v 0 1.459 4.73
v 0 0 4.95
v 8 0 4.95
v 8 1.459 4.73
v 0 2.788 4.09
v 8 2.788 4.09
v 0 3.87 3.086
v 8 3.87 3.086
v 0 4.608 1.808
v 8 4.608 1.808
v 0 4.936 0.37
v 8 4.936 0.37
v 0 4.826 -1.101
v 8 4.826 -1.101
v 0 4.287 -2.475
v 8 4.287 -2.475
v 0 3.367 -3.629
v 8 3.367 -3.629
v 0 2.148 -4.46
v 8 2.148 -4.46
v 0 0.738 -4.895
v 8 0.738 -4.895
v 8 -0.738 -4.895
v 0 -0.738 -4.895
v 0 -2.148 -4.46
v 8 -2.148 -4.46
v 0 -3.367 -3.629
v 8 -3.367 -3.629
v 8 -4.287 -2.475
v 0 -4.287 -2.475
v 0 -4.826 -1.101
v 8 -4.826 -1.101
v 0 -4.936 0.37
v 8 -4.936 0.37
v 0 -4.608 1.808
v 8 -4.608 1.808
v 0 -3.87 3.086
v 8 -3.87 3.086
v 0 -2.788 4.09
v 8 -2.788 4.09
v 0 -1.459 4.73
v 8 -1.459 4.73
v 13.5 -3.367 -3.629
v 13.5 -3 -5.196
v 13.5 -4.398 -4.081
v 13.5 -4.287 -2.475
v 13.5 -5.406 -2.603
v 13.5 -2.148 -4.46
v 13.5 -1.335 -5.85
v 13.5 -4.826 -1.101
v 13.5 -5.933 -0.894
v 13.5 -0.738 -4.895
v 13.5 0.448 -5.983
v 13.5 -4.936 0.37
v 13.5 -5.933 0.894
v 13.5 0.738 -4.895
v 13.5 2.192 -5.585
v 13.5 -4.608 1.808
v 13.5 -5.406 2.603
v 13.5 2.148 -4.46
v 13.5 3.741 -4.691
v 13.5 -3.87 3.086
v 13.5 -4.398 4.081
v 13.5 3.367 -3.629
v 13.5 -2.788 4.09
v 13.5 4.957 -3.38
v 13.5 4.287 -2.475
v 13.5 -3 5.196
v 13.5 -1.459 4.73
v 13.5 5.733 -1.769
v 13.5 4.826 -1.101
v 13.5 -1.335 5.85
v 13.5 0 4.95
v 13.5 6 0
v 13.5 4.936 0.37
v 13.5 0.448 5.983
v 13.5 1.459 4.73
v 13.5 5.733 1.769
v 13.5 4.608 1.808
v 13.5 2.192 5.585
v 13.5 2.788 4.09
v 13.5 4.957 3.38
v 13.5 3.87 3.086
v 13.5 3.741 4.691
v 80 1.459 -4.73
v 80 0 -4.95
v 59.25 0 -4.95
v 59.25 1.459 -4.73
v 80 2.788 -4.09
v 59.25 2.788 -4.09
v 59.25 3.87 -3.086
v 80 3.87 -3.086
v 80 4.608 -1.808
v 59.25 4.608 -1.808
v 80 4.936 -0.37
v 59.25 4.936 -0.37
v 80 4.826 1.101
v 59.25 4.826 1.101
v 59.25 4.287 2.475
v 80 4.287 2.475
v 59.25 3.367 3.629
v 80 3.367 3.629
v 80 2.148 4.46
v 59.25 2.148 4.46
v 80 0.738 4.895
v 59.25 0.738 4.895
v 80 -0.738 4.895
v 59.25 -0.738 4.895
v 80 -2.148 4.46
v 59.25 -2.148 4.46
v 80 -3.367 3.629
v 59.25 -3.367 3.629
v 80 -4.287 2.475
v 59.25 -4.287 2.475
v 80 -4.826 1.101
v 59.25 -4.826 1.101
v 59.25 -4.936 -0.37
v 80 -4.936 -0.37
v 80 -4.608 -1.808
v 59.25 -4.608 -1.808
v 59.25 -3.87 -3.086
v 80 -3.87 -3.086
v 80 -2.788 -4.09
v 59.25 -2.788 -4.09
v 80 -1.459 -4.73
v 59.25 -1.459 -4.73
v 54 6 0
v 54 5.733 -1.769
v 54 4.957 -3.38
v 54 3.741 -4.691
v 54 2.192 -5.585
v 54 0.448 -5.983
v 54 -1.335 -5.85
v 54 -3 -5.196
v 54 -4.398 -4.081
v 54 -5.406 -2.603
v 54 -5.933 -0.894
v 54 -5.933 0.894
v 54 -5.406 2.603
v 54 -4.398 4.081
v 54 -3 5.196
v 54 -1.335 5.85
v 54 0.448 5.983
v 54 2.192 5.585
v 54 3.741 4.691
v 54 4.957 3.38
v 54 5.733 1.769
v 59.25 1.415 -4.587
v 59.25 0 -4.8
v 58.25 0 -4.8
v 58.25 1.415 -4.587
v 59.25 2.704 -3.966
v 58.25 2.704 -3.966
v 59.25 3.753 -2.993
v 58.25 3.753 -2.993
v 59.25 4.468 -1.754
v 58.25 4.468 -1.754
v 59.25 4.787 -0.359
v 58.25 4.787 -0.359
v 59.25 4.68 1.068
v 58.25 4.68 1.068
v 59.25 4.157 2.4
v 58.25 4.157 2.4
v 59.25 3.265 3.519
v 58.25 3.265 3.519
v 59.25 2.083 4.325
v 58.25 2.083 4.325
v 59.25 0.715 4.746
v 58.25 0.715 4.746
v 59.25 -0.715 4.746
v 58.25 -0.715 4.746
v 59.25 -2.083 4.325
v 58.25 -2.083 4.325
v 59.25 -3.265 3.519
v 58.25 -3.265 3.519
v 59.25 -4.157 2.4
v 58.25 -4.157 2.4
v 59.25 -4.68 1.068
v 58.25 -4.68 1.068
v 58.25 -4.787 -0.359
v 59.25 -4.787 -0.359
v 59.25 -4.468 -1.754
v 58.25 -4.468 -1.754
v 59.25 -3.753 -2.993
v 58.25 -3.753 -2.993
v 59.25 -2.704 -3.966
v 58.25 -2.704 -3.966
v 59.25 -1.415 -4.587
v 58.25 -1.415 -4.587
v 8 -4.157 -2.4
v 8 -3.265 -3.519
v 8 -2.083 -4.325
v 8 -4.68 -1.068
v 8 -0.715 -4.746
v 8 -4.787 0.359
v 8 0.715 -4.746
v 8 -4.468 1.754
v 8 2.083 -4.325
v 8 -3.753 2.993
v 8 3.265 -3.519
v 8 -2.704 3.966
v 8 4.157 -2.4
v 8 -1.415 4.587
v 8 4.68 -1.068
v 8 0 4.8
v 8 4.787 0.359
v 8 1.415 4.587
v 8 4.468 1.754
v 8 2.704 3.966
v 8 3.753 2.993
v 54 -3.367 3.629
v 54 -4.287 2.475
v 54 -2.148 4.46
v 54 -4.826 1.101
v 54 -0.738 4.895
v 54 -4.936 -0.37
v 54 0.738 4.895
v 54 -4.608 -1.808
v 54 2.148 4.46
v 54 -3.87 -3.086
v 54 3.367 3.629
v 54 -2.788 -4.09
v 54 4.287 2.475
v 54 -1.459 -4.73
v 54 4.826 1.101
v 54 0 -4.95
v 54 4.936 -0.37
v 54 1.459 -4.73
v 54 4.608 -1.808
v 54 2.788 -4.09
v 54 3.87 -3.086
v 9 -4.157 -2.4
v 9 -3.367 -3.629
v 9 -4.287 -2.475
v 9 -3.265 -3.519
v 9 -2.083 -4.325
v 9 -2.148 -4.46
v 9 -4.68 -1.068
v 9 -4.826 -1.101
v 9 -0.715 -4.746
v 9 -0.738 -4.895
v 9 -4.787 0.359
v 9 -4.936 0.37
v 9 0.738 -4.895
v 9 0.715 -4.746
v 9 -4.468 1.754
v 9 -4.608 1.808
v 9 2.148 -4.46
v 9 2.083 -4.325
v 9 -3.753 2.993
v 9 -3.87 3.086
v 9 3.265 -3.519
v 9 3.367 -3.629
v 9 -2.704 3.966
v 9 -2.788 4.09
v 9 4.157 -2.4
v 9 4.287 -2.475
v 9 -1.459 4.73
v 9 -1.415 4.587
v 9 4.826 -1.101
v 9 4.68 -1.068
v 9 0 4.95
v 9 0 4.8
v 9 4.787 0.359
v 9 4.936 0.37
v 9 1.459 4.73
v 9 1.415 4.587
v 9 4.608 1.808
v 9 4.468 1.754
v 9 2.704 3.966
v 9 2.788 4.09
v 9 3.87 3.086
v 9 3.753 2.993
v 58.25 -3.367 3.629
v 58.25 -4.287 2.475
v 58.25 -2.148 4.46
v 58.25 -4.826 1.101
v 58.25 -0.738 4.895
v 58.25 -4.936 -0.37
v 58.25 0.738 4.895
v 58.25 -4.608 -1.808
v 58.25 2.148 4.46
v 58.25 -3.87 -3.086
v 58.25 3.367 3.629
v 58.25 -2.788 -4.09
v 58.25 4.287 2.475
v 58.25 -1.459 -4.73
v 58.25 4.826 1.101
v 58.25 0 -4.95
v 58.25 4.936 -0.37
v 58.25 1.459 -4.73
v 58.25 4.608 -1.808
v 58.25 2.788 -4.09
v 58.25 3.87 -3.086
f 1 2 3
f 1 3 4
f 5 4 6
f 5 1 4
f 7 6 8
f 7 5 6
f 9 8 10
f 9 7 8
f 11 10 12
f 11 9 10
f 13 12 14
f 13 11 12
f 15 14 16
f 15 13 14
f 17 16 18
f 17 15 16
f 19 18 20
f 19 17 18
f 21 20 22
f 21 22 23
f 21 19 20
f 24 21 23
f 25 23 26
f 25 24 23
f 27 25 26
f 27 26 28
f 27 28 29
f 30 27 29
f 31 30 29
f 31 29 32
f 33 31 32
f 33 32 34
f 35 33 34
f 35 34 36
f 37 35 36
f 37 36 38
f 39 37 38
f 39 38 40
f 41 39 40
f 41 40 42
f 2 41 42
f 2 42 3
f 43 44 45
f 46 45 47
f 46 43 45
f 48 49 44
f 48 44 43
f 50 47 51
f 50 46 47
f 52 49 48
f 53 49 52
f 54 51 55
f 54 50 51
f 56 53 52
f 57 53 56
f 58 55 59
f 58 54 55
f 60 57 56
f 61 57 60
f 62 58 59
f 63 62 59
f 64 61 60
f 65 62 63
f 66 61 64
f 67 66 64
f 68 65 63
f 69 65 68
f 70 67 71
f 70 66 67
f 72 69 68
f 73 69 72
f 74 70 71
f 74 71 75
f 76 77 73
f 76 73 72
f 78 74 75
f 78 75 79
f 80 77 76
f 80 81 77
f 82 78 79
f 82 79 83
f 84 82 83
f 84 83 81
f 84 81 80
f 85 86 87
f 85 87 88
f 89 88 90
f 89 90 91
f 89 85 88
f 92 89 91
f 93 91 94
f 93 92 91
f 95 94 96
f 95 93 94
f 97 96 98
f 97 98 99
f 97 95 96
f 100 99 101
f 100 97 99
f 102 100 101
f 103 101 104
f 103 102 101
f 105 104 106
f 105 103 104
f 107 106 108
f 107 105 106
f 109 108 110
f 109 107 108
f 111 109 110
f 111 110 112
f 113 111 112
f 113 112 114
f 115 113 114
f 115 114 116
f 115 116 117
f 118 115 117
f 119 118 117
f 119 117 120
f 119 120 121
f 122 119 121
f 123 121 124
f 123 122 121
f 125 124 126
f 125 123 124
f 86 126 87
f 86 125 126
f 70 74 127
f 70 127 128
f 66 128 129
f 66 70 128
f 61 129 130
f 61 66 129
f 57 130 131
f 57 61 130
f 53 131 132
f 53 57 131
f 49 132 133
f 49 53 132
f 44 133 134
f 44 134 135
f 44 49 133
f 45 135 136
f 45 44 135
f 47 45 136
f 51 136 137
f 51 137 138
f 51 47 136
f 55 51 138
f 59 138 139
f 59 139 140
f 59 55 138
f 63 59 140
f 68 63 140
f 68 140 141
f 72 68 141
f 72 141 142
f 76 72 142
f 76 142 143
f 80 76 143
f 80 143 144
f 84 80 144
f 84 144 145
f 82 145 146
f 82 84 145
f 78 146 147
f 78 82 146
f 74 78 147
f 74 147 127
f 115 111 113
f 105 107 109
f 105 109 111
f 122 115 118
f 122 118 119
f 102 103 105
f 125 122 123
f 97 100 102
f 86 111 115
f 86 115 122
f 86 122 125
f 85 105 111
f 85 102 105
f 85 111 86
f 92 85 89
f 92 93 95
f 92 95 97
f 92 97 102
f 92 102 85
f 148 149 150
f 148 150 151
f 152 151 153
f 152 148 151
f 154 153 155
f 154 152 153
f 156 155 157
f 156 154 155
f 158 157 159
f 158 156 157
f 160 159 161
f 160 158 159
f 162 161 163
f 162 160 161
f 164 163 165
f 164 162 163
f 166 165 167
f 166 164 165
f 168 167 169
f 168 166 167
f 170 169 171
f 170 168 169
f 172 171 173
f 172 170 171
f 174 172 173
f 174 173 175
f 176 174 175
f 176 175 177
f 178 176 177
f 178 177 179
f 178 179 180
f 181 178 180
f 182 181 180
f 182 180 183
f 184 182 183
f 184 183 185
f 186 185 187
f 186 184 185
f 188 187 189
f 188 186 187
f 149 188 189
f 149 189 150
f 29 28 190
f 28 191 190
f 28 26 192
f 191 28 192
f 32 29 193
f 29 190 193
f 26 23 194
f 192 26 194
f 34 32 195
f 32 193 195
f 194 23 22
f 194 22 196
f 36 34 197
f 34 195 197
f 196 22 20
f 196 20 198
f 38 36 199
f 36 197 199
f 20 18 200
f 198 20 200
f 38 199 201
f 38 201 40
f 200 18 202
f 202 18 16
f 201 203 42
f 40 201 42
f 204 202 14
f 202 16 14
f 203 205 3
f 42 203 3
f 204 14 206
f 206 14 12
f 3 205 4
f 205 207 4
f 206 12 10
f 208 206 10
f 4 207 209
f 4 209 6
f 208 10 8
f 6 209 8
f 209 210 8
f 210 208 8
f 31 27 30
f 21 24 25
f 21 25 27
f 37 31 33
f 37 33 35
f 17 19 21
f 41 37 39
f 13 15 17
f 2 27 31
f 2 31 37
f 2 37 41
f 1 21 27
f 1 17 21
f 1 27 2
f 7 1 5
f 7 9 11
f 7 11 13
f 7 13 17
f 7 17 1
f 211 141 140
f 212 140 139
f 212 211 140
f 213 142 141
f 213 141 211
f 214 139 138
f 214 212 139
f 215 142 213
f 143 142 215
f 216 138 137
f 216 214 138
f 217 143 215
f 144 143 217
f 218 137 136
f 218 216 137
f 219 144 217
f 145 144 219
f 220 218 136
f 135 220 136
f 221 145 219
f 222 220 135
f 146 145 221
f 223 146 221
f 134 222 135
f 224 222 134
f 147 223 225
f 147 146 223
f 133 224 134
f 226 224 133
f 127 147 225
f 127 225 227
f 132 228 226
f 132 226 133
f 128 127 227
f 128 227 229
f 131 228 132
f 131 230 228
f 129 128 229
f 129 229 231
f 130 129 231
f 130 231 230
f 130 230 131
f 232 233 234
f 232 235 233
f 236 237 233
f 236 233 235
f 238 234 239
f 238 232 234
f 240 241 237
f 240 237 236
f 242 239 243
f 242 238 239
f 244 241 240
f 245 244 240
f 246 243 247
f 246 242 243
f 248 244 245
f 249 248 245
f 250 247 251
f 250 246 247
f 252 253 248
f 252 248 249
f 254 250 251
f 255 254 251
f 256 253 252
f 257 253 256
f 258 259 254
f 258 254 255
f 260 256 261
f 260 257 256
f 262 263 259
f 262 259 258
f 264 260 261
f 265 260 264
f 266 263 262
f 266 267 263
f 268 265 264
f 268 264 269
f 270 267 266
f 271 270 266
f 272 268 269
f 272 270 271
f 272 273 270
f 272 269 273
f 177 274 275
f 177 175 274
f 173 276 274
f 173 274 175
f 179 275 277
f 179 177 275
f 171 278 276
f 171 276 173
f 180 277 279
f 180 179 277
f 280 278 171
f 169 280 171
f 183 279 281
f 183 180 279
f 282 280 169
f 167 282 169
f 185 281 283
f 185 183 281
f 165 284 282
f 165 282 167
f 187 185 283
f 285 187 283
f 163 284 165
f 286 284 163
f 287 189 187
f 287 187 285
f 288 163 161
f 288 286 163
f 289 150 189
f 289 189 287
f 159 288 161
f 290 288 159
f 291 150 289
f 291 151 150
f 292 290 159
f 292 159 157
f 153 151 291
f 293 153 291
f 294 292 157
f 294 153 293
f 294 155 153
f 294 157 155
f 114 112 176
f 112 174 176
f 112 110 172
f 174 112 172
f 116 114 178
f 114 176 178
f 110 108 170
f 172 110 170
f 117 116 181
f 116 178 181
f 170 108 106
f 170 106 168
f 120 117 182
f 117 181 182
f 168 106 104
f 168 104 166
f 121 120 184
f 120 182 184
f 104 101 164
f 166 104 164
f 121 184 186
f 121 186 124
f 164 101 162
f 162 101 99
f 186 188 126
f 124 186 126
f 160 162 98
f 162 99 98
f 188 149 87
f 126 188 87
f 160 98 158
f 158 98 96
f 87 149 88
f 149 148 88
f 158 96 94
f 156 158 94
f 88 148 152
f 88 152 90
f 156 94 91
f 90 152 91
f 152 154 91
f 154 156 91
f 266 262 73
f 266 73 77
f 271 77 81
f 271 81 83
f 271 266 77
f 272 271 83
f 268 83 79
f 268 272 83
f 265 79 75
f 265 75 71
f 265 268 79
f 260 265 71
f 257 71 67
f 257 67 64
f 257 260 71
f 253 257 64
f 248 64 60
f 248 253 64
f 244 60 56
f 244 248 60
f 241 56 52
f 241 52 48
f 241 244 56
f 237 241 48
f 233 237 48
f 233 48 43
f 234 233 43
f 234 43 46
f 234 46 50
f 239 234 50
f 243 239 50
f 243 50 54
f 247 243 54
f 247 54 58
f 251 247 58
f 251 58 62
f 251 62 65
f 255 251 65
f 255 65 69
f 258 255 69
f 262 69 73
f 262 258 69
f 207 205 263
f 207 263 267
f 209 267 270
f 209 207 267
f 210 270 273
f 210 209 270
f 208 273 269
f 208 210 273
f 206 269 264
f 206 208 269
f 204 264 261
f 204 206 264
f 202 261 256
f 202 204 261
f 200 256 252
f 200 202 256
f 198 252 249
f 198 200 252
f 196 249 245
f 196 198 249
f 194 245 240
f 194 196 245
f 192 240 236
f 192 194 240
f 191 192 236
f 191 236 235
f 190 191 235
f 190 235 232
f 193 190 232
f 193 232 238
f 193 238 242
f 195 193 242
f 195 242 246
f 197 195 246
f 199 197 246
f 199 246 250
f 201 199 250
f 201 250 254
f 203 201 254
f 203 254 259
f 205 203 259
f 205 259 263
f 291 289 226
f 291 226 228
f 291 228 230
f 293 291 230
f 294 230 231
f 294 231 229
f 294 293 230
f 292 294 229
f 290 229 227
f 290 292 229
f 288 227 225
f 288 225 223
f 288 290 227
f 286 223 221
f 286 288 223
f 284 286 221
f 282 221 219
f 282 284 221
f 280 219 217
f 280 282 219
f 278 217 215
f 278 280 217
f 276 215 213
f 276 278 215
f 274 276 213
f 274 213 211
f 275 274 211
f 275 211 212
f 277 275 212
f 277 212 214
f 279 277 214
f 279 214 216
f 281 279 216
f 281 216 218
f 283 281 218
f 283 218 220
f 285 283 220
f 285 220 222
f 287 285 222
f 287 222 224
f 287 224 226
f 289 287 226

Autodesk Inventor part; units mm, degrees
ref_plane "YZ Plane" through (0, 0, 0) normal (1, 0, 0) x (0, 1, 0)
ref_plane "XZ Plane" through (0, 0, 0) normal (0, 1, 0) x (-1, 0, 0)
ref_plane "XY Plane" through (0, 0, 0) normal (0, 0, 1) x (1, 0, 0)
sketch "스케치1" plane through (0, 0, 0) normal (1, 0, 0) x (0, 1, 0)
  circle A0 centre (0, 0) radius 6
  dimension "d0" = 12
extrude "돌출1" add sketch "스케치1" along normal blind 80
sketch "스케치2" plane through (80, 0, 0) normal (1, 0, 0) x (0, 0, -1)
  circle A0 centre (0, 0) radius 6
  circle A1 centre (0, 0) radius 4.95
  dimension "d3" = 9.9
extrude "돌출2" cut sketch "스케치2" against normal blind 26
sketch "스케치3" plane through (80, 0, 0) normal (1, 0, 0) x (0, 0, -1)
  circle A0 centre (0, 0) radius 4.95
  circle A1 centre (0, 0) radius 4.8
  dimension "d6" = 9.9
  dimension "d7" = 9.6
extrude "돌출3" cut sketch "스케치3" against normal blind 21.75
sketch "스케치4" plane through (80, 0, 0) normal (1, 0, 0) x (0, 0, -1)
  circle A0 centre (0, 0) radius 4.95
  circle A1 centre (0, 0) radius 4.8
  dimension "d10" = 9.9
  dimension "d11" = 9.6
extrude "돌출4" add sketch "스케치4" against normal blind 20.75
sketch "스케치5" plane through (0, 0, 0) normal (-1, 0, 0) x (0, 0, 1)
  circle A0 centre (0, 0) radius 6
  circle A1 centre (0, 0) radius 4.95
  dimension "d14" = 12
  dimension "d15" = 9.9
extrude "돌출5" cut sketch "스케치5" against normal blind 13.5
sketch "스케치6" plane through (0, 0, 0) normal (-1, 0, 0) x (0, 0, 1)
  circle A0 centre (0, 0) radius 4.95
  circle A1 centre (0, 0) radius 4.8
  dimension "d18" = 9.9
  dimension "d19" = 9.6
extrude "돌출6" cut sketch "스케치6" against normal blind 9
sketch "스케치7" plane through (0, 0, 0) normal (-1, 0, 0) x (0, 0, 1)
  circle A0 centre (0, 0) radius 4.95
  circle A1 centre (0, 0) radius 4.8
  dimension "d22" = 9.9
  dimension "d23" = 9.6
extrude "돌출7" add sketch "스케치7" against normal blind 8
properties part number "10PI축"
